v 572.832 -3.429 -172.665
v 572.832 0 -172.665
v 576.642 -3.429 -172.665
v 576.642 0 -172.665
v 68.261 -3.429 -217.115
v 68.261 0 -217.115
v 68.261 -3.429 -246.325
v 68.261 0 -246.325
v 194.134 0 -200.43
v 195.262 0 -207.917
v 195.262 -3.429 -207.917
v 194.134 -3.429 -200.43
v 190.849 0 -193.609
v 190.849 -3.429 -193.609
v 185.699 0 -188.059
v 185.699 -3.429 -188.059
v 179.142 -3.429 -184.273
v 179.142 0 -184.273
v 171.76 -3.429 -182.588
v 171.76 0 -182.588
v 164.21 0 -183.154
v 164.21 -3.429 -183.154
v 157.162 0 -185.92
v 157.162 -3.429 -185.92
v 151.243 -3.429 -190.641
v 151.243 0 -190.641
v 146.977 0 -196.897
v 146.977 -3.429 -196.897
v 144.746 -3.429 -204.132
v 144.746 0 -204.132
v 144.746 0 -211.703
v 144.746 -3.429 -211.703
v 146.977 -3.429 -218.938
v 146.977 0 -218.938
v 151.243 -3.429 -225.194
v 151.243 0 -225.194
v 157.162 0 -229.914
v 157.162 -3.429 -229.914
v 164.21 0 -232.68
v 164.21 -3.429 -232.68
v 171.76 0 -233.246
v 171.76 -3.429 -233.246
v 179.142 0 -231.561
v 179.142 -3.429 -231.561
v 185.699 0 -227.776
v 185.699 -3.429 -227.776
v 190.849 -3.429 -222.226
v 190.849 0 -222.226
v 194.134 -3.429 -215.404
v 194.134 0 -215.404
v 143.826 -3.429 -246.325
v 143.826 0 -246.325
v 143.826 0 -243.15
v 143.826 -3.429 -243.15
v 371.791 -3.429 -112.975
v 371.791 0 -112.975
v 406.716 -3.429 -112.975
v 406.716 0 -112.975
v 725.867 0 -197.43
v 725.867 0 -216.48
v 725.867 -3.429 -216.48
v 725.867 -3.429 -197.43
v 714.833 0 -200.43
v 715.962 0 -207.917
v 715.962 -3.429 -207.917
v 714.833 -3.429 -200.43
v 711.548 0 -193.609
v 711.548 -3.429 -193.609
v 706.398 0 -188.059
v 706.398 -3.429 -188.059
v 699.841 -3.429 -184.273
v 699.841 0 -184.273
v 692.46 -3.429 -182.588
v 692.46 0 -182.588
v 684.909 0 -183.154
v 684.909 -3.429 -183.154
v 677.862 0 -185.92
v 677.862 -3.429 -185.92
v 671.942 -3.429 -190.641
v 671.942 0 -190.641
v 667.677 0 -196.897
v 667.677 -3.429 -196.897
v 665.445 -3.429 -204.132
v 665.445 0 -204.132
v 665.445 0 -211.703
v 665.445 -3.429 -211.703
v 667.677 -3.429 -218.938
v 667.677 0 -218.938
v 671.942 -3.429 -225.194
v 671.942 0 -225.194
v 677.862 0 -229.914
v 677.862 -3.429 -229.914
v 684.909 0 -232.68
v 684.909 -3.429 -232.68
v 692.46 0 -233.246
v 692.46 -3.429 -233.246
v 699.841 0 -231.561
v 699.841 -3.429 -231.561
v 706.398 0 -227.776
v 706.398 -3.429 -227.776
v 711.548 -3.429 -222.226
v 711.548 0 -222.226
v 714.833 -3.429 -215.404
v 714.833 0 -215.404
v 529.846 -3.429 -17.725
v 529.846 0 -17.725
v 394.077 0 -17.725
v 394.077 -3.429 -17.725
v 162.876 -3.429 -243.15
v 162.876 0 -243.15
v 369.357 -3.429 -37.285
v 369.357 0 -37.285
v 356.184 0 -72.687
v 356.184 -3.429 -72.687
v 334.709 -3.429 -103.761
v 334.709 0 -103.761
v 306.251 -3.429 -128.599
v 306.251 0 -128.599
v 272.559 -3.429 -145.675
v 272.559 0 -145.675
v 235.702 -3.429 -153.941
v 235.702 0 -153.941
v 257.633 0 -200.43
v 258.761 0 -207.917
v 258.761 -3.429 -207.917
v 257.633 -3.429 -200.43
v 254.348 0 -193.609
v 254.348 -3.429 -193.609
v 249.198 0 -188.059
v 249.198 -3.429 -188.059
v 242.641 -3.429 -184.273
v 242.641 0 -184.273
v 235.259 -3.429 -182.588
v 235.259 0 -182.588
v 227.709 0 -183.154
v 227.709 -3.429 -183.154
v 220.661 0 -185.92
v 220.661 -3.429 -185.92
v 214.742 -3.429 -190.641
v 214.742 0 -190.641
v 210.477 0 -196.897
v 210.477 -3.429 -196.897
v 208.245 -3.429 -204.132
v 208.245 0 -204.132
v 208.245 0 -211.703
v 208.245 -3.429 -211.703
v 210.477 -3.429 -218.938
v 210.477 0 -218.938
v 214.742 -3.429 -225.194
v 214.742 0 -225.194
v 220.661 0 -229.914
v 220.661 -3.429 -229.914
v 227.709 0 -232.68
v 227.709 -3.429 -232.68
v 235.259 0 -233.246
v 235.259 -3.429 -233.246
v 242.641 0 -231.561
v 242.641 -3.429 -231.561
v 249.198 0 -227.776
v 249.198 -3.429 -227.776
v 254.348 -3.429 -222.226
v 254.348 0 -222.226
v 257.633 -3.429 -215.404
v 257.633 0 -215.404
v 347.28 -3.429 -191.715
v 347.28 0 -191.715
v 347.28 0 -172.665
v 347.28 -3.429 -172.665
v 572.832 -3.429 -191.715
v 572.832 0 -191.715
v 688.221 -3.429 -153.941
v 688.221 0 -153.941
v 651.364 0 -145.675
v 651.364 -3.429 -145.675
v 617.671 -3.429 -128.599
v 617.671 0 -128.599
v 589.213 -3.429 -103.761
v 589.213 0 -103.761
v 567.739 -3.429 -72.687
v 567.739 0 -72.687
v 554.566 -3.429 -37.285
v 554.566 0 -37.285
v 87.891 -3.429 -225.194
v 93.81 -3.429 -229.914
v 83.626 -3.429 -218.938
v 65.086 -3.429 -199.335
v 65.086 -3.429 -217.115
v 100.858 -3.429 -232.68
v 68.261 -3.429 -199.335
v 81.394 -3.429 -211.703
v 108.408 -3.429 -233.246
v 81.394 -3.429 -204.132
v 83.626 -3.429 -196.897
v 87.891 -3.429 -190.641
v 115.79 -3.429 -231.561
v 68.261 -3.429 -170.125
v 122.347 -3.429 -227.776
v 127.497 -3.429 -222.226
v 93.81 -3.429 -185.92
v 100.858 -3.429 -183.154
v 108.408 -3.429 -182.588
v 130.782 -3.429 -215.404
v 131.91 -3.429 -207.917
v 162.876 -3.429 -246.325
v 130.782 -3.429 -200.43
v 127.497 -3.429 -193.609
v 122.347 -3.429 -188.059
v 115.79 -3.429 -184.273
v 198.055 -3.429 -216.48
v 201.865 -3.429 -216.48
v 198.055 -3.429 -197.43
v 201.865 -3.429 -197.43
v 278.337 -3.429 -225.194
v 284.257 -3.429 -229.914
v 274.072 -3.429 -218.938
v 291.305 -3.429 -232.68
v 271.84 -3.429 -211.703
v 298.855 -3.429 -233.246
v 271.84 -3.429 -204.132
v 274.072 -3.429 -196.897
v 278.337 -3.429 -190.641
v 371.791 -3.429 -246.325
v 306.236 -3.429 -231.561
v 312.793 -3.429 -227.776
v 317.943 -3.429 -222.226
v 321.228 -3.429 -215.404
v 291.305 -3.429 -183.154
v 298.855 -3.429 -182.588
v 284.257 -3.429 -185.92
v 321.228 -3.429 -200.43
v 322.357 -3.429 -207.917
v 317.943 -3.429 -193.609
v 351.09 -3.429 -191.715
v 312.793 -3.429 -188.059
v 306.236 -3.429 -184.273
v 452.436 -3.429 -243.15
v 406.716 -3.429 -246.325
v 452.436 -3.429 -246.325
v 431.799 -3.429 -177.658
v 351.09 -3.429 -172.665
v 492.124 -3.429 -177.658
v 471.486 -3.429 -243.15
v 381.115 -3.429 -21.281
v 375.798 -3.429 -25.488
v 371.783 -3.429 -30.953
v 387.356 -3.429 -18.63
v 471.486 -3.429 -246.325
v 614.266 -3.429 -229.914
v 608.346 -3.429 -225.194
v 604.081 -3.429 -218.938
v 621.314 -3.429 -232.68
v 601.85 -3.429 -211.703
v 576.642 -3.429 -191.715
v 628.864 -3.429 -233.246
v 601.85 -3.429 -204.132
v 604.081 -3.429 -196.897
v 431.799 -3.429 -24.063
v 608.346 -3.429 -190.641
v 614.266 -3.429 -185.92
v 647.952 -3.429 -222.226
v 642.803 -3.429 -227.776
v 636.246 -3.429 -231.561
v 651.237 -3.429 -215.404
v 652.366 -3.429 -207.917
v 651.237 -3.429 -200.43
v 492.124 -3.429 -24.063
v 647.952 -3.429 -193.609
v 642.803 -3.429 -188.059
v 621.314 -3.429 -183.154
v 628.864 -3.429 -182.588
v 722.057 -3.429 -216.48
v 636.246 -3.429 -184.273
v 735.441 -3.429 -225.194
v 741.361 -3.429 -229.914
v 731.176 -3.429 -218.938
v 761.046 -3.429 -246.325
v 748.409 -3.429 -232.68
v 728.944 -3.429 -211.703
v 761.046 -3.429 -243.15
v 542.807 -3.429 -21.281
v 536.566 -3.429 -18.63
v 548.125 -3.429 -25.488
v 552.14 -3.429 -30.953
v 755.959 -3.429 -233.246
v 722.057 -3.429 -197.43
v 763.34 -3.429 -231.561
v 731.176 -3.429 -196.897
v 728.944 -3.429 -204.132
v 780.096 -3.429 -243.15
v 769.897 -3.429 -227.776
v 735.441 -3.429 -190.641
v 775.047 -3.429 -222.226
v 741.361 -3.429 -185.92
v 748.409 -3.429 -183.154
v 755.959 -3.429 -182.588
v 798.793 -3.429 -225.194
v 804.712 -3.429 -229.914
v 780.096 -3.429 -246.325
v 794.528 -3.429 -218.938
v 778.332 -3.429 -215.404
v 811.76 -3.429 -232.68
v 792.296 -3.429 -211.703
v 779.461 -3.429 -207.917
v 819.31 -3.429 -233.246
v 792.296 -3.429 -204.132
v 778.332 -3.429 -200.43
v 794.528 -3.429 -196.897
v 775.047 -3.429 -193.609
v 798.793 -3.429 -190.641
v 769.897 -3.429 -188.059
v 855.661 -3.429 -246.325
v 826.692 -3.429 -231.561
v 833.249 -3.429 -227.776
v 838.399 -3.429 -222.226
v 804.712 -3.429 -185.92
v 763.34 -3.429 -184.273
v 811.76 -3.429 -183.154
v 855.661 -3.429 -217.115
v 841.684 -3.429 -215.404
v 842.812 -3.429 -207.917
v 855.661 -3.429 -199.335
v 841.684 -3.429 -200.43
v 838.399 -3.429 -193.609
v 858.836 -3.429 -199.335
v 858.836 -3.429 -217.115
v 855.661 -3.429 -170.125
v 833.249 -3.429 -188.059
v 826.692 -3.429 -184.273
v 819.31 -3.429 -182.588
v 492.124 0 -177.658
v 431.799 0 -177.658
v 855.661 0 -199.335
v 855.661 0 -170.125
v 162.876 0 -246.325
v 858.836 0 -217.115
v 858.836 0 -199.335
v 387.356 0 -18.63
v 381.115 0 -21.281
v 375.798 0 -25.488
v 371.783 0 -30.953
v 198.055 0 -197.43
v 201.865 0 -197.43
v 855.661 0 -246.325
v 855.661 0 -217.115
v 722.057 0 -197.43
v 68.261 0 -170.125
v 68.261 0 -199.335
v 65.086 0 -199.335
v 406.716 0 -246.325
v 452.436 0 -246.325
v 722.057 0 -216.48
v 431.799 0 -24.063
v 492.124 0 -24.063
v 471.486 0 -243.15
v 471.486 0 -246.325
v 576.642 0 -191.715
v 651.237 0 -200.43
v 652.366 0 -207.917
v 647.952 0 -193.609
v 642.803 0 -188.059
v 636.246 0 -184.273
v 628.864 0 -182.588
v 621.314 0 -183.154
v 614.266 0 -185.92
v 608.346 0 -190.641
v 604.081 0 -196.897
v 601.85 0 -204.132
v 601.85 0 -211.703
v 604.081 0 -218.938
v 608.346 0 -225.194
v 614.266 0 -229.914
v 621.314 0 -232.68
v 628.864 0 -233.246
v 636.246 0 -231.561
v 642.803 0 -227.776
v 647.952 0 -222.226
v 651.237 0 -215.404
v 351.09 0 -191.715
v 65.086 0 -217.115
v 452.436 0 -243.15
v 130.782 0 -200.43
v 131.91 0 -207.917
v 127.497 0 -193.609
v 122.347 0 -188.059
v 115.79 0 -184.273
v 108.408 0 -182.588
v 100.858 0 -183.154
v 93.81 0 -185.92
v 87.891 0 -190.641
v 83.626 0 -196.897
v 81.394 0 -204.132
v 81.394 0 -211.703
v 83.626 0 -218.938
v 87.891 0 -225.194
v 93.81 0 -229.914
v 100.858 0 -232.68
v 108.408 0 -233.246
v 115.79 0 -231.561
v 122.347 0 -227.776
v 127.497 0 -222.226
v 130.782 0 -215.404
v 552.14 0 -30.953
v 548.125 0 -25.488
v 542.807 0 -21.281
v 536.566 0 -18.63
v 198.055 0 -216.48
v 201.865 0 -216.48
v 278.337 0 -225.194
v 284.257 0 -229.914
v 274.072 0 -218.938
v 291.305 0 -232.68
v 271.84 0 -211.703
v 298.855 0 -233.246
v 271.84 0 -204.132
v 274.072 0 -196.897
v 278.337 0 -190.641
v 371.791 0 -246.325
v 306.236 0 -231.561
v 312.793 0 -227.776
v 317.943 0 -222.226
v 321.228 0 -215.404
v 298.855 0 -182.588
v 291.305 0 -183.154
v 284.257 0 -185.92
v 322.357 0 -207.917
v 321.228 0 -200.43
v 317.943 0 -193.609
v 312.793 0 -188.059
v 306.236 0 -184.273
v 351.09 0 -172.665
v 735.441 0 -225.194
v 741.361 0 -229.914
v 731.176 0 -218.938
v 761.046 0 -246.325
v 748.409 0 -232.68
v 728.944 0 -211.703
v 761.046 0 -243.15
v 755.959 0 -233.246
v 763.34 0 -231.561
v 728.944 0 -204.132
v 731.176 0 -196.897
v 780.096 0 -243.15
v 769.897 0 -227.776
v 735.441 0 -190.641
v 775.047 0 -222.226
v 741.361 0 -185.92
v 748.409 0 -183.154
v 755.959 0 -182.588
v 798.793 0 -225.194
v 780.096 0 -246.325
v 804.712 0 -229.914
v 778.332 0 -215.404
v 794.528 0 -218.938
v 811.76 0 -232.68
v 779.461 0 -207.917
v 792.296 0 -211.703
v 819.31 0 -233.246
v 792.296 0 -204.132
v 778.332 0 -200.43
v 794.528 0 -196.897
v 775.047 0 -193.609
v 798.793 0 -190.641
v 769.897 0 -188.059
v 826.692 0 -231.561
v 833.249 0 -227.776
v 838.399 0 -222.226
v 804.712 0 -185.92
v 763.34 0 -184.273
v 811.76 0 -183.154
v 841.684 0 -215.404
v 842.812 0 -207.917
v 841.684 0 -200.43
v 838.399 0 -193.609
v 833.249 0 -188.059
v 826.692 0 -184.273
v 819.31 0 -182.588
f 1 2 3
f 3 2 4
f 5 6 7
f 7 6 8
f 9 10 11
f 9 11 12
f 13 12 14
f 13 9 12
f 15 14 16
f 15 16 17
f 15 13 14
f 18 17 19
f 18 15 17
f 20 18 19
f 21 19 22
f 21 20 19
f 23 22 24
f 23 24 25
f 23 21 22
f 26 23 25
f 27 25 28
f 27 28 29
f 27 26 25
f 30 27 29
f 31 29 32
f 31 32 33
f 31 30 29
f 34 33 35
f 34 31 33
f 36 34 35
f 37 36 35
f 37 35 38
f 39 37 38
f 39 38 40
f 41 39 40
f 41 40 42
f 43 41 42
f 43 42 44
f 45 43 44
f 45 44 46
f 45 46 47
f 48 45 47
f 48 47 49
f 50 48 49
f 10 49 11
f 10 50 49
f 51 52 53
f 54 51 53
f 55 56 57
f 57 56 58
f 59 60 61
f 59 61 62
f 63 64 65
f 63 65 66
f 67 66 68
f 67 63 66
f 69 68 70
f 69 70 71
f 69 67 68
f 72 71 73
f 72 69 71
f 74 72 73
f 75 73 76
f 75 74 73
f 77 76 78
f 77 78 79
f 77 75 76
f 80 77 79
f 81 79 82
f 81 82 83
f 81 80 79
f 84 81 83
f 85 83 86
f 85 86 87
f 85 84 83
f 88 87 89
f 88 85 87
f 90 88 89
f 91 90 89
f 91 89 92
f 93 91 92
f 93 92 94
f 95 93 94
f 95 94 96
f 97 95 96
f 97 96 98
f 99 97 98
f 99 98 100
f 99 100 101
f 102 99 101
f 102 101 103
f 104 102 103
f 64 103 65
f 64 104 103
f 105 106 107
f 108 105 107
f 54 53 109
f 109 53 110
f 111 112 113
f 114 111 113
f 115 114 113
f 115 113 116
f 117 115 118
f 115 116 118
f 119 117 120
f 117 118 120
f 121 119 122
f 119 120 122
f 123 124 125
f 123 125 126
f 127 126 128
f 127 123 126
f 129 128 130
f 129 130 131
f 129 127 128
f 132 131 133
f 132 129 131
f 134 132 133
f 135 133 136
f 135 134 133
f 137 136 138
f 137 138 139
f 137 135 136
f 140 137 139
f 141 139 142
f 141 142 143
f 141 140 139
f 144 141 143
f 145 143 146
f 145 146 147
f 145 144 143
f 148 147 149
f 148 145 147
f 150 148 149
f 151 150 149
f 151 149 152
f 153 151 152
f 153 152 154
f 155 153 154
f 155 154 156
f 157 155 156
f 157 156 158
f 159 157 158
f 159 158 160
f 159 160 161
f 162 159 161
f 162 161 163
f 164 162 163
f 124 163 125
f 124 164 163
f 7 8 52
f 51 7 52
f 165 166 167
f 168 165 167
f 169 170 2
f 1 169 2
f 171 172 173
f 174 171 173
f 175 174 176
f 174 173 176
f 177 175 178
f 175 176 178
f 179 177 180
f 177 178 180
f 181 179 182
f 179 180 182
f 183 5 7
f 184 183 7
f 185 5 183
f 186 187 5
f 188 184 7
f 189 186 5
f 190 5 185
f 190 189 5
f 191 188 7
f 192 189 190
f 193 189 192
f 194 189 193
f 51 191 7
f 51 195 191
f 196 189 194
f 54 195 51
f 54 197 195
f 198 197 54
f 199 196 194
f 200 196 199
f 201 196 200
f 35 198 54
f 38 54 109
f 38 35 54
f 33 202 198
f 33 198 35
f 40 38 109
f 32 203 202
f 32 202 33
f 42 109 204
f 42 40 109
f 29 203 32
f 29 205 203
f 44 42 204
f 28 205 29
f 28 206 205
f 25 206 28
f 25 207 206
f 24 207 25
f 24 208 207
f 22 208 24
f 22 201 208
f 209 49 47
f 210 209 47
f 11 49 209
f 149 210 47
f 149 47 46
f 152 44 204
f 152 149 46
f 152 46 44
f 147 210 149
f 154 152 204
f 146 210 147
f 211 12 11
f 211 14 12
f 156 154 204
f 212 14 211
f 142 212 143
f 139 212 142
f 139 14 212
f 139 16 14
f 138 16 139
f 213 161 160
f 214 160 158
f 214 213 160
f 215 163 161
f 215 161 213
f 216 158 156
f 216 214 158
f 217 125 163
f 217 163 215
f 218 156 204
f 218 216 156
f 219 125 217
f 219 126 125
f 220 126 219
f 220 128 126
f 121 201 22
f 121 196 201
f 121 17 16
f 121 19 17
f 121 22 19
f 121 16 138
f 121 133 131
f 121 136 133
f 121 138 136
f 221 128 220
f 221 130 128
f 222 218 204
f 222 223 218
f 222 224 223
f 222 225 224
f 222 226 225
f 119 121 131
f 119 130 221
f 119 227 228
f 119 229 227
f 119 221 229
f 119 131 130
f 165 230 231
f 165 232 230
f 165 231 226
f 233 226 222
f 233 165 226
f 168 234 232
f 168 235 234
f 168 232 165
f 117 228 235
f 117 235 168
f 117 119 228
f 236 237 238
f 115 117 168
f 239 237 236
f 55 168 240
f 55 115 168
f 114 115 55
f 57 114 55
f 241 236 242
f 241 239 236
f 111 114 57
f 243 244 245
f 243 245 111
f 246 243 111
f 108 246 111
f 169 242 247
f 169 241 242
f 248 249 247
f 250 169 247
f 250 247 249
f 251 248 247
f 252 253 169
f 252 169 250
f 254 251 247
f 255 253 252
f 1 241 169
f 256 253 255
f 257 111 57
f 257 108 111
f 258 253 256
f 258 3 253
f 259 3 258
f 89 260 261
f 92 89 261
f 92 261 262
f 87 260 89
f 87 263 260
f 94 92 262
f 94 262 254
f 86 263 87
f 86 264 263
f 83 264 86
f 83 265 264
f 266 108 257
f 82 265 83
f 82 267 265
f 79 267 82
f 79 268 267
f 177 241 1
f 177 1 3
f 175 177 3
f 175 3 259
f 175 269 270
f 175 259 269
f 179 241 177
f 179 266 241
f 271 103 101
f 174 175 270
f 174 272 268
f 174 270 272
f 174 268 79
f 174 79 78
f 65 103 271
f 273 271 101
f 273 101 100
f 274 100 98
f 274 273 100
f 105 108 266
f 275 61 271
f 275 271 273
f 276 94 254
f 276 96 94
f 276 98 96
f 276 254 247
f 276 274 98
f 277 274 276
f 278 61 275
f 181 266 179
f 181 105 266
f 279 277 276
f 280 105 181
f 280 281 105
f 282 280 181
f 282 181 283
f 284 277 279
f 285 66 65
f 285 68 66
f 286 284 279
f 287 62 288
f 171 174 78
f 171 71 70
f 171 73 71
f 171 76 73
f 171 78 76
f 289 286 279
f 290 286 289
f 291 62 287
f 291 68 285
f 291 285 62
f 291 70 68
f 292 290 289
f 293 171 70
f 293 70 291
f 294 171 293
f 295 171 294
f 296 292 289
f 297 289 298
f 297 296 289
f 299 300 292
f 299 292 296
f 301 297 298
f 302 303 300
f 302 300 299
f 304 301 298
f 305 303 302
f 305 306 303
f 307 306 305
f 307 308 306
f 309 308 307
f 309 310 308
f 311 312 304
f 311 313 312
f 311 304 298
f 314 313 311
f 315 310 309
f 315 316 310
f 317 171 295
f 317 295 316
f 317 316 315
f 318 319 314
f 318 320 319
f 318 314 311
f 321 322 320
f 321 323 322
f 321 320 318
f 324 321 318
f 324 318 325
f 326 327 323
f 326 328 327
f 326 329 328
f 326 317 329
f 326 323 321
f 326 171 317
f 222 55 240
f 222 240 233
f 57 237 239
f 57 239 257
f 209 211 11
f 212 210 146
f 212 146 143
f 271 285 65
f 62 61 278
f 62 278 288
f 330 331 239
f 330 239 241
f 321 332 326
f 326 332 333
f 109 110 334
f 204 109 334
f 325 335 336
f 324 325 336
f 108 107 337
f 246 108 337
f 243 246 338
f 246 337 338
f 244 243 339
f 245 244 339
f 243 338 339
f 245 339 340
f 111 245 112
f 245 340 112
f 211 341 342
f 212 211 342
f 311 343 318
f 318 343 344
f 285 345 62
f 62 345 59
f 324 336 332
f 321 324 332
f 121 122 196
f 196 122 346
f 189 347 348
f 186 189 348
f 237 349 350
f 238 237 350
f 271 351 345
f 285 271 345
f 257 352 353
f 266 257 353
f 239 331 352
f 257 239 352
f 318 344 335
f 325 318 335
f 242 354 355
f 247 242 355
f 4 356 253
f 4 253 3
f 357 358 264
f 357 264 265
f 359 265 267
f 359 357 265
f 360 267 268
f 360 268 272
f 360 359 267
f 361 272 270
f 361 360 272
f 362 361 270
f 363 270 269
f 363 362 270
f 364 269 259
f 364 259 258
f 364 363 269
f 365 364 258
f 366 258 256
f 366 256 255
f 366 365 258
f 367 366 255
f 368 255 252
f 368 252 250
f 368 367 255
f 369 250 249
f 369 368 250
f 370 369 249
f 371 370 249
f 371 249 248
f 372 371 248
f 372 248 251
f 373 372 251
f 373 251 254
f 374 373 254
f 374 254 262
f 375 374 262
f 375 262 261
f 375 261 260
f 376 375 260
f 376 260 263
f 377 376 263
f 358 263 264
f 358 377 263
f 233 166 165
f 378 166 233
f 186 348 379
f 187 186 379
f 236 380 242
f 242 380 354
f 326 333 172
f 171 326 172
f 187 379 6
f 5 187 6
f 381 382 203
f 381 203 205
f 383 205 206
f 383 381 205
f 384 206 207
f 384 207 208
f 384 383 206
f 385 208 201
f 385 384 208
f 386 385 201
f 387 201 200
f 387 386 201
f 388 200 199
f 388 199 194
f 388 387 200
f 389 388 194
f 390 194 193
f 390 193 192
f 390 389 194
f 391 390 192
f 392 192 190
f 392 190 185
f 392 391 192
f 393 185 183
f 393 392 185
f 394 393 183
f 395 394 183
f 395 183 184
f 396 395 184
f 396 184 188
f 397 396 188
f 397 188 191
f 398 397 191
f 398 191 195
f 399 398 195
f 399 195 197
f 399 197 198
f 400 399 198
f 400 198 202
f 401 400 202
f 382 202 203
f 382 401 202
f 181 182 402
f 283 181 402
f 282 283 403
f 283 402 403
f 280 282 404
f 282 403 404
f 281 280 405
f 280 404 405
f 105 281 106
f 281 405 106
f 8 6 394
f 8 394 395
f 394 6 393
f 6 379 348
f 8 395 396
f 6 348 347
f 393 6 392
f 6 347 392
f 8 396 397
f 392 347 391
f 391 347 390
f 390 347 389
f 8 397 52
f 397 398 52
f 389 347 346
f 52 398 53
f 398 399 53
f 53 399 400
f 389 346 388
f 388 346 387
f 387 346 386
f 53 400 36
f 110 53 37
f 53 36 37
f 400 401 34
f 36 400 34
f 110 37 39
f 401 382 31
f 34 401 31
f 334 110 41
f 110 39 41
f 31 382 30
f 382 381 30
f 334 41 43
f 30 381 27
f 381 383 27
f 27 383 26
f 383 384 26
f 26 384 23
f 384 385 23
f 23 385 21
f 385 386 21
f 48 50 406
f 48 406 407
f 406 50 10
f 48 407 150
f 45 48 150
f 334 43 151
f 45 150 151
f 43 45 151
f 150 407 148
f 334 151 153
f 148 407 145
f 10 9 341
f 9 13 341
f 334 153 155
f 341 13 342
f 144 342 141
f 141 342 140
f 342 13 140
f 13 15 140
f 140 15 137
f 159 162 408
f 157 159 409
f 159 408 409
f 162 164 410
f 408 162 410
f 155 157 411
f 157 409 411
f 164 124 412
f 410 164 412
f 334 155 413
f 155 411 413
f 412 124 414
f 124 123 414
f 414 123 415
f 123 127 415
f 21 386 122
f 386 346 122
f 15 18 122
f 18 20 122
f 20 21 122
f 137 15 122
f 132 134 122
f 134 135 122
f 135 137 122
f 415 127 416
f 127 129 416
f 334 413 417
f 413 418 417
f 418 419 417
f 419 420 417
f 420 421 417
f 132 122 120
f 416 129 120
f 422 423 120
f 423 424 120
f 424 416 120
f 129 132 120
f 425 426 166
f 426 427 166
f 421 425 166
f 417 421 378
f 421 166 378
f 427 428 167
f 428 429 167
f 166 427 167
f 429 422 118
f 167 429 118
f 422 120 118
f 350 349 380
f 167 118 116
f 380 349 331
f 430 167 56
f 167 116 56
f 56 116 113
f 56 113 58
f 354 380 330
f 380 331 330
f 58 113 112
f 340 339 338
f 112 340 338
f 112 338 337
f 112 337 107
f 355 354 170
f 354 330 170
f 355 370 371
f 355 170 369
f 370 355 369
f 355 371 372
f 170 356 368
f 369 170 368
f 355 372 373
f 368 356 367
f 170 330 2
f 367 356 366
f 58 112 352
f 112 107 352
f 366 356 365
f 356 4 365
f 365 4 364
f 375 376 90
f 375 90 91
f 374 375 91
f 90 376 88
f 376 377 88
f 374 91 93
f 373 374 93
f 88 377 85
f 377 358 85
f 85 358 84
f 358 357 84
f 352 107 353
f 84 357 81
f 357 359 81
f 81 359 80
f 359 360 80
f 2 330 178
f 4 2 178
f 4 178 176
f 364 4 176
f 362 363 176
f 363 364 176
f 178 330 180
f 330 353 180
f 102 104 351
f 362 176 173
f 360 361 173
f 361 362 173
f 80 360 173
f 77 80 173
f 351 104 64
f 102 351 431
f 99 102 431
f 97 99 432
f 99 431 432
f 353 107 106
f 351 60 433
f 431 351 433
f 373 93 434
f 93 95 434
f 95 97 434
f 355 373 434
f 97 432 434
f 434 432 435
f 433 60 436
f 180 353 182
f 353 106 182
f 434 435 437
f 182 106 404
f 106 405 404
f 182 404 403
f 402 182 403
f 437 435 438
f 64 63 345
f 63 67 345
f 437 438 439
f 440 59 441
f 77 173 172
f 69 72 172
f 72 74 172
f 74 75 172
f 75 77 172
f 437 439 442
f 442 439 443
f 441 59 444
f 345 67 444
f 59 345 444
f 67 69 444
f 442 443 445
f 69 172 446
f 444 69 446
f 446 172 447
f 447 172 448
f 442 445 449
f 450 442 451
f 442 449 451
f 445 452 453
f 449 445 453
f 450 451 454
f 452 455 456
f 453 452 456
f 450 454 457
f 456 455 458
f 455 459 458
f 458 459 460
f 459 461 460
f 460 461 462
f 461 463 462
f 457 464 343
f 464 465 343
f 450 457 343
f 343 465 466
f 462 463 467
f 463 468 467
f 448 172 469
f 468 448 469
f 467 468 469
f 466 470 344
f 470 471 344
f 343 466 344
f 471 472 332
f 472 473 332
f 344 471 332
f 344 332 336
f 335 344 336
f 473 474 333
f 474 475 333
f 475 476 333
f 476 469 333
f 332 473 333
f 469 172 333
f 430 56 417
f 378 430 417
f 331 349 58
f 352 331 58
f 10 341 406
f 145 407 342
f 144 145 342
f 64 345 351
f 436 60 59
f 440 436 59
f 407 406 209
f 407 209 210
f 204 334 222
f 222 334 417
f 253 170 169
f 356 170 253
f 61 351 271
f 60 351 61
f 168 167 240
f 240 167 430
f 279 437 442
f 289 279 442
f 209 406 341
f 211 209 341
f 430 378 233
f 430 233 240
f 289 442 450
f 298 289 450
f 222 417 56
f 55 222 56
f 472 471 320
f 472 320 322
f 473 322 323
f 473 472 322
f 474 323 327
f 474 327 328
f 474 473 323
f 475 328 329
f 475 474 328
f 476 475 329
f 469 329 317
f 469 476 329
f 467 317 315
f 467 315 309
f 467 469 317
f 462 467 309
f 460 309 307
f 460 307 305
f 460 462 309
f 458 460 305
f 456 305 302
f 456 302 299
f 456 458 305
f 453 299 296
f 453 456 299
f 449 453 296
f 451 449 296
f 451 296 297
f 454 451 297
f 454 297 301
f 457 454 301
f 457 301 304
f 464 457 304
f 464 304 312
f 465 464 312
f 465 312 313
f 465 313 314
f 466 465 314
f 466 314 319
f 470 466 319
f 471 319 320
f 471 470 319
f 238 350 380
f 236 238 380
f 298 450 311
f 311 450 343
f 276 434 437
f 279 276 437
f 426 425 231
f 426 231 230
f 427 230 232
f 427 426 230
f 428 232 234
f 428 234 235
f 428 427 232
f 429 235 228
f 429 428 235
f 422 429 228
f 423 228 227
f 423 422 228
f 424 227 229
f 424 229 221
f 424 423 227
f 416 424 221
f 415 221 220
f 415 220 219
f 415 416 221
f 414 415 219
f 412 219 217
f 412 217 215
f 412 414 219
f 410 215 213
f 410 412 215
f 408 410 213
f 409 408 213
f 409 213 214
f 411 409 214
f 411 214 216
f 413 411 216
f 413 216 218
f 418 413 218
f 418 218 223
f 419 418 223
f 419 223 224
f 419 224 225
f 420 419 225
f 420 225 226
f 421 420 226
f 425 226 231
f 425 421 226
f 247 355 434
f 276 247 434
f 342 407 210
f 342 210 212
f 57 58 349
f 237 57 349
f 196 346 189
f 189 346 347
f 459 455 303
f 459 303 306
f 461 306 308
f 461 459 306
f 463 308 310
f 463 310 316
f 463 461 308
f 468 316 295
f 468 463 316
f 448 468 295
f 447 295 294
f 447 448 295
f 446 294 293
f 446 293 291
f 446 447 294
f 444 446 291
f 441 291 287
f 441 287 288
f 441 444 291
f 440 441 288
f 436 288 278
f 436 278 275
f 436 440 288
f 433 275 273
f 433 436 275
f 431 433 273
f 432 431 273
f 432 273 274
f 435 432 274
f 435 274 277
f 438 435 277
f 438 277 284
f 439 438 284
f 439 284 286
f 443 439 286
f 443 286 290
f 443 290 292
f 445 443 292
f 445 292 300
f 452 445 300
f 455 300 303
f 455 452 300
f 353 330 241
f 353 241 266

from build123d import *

# Parameters (mm, degrees)
F0_R     = 25.4
F0_W     = 3.81
F0_H     = 19.05
F0_W_2   = 60.325
F0_H_2   = 153.5942826
F1_DEPTH = 3.429


# Not quite as in the source:
# - ends of sketch curves that miss each other by under 0.0002 mm in the source are joined


with BuildPart() as f1:
    # F0 (on Front) → F1 (new body)
    with BuildSketch(Plane.XZ):
        with BuildLine():
            Line((68.2613062, -217.1147804), (68.2613062, -246.3247804))
            Line((68.2613062, -246.3247804), (143.8263062, -246.3247804))
            Line((143.8263062, -246.3247804), (143.8263062, -243.1497804))
            Line((143.8263062, -243.1497804), (162.8763062, -243.1497804))
            Line((162.8763062, -243.1497804), (162.8763062, -246.3247804))
            Line((162.8763062, -246.3247804), (371.7913062, -246.3247804))
            Line((371.7913062, -246.3247804), (371.7913062, -112.9747804))
            Line((371.7913062, -112.9747804), (406.7163062, -112.9747804))
            Line((406.7163062, -112.9747804), (406.7163062, -246.3247804))
            Line((406.7163062, -246.3247804), (452.4363062, -246.3247804))
            Line((452.4363062, -246.3247804), (452.4363062, -243.1497804))
            Line((452.4363062, -243.1497804), (471.4863062, -243.1497804))
            Line((471.4863062, -243.1497804), (471.4863062, -246.3247804))
            Line((471.4863062, -246.3247804), (761.0463062, -246.3247804))
            Line((761.0463062, -246.3247804), (761.0463062, -243.1497804))
            Line((761.0463062, -243.1497804), (780.0963062, -243.1497804))
            Line((780.0963062, -243.1497804), (780.0963062, -246.3247804))
            Line((780.0963062, -246.3247804), (855.6613062, -246.3247804))
            Line((855.6613062, -246.3247804), (855.6613062, -217.1147804))
            Line((855.6613062, -217.1147804), (858.8363062, -217.1147804))
            Line((858.8363062, -217.1147804), (858.8363062, -199.3347804))
            Line((858.8363062, -199.3347804), (855.6613062, -199.3347804))
            Line((855.6613062, -199.3347804), (855.6613062, -170.1247804))
            Line((855.6613062, -170.1247804), (688.2210772, -153.9405354))
            ThreePointArc((688.2210772, -153.9405354), (602.6698633523, -117.0648991424), (554.5656172379, -37.2851738969))
            ThreePointArc((554.5656172379, -37.2851738969), (545.6072798598, -23.2063701747), (529.846032, -17.7247804))
            Line((529.846032, -17.7247804), (394.0766058, -17.7247804))
            ThreePointArc((394.0766058, -17.7247804), (378.3153579402, -23.2063701747), (369.3569994588, -37.2851689116))
            ThreePointArc((369.3569994588, -37.2851689116), (321.2527512475, -117.0648972224), (235.7015357309, -153.9405408928))
            Line((235.7015357309, -153.9405408928), (68.2613062, -170.1247804))
            Line((68.2613062, -170.1247804), (68.2613062, -199.3347804))
            Line((68.2613062, -199.3347804), (65.0863062, -199.3347804))
            Line((65.0863062, -199.3347804), (65.0863062, -217.1147804))
            Line((65.0863062, -217.1147804), (68.2613062, -217.1147804))
        make_face()
        with Locations((106.5103026, -207.9172118)):
            Circle(F0_R, mode=Mode.SUBTRACT)
        with Locations((169.8620428, -207.9172118)):
            Circle(F0_R, mode=Mode.SUBTRACT)
        with Locations((199.9603062, -206.9547804)):
            Rectangle(F0_W, F0_H, mode=Mode.SUBTRACT)
        with Locations((233.3611284, -207.9172118)):
            Circle(F0_R, mode=Mode.SUBTRACT)
        with Locations((296.9567594, -207.9172118)):
            Circle(F0_R, mode=Mode.SUBTRACT)
        with Locations((349.1853062, -182.1897804)):
            Rectangle(F0_W, F0_H, mode=Mode.SUBTRACT)
        with Locations((626.9658784, -207.9172118)):
            Circle(F0_R, mode=Mode.SUBTRACT)
        with Locations((690.5615094, -207.9172118)):
            Circle(F0_R, mode=Mode.SUBTRACT)
        with Locations((723.9623062, -206.9547804)):
            Rectangle(F0_W, F0_H, mode=Mode.SUBTRACT)
        with Locations((754.0605696, -207.9172118)):
            Circle(F0_R, mode=Mode.SUBTRACT)
        with Locations((817.4123352, -207.9172118)):
            Circle(F0_R, mode=Mode.SUBTRACT)
        with Locations((574.7373062, -182.1897804)):
            Rectangle(F0_W, F0_H, mode=Mode.SUBTRACT)
        with Locations((461.9613062, -100.8605933)):
            Rectangle(F0_W_2, F0_H_2, mode=Mode.SUBTRACT)
    extrude(amount=F1_DEPTH)


solid = f1.part
